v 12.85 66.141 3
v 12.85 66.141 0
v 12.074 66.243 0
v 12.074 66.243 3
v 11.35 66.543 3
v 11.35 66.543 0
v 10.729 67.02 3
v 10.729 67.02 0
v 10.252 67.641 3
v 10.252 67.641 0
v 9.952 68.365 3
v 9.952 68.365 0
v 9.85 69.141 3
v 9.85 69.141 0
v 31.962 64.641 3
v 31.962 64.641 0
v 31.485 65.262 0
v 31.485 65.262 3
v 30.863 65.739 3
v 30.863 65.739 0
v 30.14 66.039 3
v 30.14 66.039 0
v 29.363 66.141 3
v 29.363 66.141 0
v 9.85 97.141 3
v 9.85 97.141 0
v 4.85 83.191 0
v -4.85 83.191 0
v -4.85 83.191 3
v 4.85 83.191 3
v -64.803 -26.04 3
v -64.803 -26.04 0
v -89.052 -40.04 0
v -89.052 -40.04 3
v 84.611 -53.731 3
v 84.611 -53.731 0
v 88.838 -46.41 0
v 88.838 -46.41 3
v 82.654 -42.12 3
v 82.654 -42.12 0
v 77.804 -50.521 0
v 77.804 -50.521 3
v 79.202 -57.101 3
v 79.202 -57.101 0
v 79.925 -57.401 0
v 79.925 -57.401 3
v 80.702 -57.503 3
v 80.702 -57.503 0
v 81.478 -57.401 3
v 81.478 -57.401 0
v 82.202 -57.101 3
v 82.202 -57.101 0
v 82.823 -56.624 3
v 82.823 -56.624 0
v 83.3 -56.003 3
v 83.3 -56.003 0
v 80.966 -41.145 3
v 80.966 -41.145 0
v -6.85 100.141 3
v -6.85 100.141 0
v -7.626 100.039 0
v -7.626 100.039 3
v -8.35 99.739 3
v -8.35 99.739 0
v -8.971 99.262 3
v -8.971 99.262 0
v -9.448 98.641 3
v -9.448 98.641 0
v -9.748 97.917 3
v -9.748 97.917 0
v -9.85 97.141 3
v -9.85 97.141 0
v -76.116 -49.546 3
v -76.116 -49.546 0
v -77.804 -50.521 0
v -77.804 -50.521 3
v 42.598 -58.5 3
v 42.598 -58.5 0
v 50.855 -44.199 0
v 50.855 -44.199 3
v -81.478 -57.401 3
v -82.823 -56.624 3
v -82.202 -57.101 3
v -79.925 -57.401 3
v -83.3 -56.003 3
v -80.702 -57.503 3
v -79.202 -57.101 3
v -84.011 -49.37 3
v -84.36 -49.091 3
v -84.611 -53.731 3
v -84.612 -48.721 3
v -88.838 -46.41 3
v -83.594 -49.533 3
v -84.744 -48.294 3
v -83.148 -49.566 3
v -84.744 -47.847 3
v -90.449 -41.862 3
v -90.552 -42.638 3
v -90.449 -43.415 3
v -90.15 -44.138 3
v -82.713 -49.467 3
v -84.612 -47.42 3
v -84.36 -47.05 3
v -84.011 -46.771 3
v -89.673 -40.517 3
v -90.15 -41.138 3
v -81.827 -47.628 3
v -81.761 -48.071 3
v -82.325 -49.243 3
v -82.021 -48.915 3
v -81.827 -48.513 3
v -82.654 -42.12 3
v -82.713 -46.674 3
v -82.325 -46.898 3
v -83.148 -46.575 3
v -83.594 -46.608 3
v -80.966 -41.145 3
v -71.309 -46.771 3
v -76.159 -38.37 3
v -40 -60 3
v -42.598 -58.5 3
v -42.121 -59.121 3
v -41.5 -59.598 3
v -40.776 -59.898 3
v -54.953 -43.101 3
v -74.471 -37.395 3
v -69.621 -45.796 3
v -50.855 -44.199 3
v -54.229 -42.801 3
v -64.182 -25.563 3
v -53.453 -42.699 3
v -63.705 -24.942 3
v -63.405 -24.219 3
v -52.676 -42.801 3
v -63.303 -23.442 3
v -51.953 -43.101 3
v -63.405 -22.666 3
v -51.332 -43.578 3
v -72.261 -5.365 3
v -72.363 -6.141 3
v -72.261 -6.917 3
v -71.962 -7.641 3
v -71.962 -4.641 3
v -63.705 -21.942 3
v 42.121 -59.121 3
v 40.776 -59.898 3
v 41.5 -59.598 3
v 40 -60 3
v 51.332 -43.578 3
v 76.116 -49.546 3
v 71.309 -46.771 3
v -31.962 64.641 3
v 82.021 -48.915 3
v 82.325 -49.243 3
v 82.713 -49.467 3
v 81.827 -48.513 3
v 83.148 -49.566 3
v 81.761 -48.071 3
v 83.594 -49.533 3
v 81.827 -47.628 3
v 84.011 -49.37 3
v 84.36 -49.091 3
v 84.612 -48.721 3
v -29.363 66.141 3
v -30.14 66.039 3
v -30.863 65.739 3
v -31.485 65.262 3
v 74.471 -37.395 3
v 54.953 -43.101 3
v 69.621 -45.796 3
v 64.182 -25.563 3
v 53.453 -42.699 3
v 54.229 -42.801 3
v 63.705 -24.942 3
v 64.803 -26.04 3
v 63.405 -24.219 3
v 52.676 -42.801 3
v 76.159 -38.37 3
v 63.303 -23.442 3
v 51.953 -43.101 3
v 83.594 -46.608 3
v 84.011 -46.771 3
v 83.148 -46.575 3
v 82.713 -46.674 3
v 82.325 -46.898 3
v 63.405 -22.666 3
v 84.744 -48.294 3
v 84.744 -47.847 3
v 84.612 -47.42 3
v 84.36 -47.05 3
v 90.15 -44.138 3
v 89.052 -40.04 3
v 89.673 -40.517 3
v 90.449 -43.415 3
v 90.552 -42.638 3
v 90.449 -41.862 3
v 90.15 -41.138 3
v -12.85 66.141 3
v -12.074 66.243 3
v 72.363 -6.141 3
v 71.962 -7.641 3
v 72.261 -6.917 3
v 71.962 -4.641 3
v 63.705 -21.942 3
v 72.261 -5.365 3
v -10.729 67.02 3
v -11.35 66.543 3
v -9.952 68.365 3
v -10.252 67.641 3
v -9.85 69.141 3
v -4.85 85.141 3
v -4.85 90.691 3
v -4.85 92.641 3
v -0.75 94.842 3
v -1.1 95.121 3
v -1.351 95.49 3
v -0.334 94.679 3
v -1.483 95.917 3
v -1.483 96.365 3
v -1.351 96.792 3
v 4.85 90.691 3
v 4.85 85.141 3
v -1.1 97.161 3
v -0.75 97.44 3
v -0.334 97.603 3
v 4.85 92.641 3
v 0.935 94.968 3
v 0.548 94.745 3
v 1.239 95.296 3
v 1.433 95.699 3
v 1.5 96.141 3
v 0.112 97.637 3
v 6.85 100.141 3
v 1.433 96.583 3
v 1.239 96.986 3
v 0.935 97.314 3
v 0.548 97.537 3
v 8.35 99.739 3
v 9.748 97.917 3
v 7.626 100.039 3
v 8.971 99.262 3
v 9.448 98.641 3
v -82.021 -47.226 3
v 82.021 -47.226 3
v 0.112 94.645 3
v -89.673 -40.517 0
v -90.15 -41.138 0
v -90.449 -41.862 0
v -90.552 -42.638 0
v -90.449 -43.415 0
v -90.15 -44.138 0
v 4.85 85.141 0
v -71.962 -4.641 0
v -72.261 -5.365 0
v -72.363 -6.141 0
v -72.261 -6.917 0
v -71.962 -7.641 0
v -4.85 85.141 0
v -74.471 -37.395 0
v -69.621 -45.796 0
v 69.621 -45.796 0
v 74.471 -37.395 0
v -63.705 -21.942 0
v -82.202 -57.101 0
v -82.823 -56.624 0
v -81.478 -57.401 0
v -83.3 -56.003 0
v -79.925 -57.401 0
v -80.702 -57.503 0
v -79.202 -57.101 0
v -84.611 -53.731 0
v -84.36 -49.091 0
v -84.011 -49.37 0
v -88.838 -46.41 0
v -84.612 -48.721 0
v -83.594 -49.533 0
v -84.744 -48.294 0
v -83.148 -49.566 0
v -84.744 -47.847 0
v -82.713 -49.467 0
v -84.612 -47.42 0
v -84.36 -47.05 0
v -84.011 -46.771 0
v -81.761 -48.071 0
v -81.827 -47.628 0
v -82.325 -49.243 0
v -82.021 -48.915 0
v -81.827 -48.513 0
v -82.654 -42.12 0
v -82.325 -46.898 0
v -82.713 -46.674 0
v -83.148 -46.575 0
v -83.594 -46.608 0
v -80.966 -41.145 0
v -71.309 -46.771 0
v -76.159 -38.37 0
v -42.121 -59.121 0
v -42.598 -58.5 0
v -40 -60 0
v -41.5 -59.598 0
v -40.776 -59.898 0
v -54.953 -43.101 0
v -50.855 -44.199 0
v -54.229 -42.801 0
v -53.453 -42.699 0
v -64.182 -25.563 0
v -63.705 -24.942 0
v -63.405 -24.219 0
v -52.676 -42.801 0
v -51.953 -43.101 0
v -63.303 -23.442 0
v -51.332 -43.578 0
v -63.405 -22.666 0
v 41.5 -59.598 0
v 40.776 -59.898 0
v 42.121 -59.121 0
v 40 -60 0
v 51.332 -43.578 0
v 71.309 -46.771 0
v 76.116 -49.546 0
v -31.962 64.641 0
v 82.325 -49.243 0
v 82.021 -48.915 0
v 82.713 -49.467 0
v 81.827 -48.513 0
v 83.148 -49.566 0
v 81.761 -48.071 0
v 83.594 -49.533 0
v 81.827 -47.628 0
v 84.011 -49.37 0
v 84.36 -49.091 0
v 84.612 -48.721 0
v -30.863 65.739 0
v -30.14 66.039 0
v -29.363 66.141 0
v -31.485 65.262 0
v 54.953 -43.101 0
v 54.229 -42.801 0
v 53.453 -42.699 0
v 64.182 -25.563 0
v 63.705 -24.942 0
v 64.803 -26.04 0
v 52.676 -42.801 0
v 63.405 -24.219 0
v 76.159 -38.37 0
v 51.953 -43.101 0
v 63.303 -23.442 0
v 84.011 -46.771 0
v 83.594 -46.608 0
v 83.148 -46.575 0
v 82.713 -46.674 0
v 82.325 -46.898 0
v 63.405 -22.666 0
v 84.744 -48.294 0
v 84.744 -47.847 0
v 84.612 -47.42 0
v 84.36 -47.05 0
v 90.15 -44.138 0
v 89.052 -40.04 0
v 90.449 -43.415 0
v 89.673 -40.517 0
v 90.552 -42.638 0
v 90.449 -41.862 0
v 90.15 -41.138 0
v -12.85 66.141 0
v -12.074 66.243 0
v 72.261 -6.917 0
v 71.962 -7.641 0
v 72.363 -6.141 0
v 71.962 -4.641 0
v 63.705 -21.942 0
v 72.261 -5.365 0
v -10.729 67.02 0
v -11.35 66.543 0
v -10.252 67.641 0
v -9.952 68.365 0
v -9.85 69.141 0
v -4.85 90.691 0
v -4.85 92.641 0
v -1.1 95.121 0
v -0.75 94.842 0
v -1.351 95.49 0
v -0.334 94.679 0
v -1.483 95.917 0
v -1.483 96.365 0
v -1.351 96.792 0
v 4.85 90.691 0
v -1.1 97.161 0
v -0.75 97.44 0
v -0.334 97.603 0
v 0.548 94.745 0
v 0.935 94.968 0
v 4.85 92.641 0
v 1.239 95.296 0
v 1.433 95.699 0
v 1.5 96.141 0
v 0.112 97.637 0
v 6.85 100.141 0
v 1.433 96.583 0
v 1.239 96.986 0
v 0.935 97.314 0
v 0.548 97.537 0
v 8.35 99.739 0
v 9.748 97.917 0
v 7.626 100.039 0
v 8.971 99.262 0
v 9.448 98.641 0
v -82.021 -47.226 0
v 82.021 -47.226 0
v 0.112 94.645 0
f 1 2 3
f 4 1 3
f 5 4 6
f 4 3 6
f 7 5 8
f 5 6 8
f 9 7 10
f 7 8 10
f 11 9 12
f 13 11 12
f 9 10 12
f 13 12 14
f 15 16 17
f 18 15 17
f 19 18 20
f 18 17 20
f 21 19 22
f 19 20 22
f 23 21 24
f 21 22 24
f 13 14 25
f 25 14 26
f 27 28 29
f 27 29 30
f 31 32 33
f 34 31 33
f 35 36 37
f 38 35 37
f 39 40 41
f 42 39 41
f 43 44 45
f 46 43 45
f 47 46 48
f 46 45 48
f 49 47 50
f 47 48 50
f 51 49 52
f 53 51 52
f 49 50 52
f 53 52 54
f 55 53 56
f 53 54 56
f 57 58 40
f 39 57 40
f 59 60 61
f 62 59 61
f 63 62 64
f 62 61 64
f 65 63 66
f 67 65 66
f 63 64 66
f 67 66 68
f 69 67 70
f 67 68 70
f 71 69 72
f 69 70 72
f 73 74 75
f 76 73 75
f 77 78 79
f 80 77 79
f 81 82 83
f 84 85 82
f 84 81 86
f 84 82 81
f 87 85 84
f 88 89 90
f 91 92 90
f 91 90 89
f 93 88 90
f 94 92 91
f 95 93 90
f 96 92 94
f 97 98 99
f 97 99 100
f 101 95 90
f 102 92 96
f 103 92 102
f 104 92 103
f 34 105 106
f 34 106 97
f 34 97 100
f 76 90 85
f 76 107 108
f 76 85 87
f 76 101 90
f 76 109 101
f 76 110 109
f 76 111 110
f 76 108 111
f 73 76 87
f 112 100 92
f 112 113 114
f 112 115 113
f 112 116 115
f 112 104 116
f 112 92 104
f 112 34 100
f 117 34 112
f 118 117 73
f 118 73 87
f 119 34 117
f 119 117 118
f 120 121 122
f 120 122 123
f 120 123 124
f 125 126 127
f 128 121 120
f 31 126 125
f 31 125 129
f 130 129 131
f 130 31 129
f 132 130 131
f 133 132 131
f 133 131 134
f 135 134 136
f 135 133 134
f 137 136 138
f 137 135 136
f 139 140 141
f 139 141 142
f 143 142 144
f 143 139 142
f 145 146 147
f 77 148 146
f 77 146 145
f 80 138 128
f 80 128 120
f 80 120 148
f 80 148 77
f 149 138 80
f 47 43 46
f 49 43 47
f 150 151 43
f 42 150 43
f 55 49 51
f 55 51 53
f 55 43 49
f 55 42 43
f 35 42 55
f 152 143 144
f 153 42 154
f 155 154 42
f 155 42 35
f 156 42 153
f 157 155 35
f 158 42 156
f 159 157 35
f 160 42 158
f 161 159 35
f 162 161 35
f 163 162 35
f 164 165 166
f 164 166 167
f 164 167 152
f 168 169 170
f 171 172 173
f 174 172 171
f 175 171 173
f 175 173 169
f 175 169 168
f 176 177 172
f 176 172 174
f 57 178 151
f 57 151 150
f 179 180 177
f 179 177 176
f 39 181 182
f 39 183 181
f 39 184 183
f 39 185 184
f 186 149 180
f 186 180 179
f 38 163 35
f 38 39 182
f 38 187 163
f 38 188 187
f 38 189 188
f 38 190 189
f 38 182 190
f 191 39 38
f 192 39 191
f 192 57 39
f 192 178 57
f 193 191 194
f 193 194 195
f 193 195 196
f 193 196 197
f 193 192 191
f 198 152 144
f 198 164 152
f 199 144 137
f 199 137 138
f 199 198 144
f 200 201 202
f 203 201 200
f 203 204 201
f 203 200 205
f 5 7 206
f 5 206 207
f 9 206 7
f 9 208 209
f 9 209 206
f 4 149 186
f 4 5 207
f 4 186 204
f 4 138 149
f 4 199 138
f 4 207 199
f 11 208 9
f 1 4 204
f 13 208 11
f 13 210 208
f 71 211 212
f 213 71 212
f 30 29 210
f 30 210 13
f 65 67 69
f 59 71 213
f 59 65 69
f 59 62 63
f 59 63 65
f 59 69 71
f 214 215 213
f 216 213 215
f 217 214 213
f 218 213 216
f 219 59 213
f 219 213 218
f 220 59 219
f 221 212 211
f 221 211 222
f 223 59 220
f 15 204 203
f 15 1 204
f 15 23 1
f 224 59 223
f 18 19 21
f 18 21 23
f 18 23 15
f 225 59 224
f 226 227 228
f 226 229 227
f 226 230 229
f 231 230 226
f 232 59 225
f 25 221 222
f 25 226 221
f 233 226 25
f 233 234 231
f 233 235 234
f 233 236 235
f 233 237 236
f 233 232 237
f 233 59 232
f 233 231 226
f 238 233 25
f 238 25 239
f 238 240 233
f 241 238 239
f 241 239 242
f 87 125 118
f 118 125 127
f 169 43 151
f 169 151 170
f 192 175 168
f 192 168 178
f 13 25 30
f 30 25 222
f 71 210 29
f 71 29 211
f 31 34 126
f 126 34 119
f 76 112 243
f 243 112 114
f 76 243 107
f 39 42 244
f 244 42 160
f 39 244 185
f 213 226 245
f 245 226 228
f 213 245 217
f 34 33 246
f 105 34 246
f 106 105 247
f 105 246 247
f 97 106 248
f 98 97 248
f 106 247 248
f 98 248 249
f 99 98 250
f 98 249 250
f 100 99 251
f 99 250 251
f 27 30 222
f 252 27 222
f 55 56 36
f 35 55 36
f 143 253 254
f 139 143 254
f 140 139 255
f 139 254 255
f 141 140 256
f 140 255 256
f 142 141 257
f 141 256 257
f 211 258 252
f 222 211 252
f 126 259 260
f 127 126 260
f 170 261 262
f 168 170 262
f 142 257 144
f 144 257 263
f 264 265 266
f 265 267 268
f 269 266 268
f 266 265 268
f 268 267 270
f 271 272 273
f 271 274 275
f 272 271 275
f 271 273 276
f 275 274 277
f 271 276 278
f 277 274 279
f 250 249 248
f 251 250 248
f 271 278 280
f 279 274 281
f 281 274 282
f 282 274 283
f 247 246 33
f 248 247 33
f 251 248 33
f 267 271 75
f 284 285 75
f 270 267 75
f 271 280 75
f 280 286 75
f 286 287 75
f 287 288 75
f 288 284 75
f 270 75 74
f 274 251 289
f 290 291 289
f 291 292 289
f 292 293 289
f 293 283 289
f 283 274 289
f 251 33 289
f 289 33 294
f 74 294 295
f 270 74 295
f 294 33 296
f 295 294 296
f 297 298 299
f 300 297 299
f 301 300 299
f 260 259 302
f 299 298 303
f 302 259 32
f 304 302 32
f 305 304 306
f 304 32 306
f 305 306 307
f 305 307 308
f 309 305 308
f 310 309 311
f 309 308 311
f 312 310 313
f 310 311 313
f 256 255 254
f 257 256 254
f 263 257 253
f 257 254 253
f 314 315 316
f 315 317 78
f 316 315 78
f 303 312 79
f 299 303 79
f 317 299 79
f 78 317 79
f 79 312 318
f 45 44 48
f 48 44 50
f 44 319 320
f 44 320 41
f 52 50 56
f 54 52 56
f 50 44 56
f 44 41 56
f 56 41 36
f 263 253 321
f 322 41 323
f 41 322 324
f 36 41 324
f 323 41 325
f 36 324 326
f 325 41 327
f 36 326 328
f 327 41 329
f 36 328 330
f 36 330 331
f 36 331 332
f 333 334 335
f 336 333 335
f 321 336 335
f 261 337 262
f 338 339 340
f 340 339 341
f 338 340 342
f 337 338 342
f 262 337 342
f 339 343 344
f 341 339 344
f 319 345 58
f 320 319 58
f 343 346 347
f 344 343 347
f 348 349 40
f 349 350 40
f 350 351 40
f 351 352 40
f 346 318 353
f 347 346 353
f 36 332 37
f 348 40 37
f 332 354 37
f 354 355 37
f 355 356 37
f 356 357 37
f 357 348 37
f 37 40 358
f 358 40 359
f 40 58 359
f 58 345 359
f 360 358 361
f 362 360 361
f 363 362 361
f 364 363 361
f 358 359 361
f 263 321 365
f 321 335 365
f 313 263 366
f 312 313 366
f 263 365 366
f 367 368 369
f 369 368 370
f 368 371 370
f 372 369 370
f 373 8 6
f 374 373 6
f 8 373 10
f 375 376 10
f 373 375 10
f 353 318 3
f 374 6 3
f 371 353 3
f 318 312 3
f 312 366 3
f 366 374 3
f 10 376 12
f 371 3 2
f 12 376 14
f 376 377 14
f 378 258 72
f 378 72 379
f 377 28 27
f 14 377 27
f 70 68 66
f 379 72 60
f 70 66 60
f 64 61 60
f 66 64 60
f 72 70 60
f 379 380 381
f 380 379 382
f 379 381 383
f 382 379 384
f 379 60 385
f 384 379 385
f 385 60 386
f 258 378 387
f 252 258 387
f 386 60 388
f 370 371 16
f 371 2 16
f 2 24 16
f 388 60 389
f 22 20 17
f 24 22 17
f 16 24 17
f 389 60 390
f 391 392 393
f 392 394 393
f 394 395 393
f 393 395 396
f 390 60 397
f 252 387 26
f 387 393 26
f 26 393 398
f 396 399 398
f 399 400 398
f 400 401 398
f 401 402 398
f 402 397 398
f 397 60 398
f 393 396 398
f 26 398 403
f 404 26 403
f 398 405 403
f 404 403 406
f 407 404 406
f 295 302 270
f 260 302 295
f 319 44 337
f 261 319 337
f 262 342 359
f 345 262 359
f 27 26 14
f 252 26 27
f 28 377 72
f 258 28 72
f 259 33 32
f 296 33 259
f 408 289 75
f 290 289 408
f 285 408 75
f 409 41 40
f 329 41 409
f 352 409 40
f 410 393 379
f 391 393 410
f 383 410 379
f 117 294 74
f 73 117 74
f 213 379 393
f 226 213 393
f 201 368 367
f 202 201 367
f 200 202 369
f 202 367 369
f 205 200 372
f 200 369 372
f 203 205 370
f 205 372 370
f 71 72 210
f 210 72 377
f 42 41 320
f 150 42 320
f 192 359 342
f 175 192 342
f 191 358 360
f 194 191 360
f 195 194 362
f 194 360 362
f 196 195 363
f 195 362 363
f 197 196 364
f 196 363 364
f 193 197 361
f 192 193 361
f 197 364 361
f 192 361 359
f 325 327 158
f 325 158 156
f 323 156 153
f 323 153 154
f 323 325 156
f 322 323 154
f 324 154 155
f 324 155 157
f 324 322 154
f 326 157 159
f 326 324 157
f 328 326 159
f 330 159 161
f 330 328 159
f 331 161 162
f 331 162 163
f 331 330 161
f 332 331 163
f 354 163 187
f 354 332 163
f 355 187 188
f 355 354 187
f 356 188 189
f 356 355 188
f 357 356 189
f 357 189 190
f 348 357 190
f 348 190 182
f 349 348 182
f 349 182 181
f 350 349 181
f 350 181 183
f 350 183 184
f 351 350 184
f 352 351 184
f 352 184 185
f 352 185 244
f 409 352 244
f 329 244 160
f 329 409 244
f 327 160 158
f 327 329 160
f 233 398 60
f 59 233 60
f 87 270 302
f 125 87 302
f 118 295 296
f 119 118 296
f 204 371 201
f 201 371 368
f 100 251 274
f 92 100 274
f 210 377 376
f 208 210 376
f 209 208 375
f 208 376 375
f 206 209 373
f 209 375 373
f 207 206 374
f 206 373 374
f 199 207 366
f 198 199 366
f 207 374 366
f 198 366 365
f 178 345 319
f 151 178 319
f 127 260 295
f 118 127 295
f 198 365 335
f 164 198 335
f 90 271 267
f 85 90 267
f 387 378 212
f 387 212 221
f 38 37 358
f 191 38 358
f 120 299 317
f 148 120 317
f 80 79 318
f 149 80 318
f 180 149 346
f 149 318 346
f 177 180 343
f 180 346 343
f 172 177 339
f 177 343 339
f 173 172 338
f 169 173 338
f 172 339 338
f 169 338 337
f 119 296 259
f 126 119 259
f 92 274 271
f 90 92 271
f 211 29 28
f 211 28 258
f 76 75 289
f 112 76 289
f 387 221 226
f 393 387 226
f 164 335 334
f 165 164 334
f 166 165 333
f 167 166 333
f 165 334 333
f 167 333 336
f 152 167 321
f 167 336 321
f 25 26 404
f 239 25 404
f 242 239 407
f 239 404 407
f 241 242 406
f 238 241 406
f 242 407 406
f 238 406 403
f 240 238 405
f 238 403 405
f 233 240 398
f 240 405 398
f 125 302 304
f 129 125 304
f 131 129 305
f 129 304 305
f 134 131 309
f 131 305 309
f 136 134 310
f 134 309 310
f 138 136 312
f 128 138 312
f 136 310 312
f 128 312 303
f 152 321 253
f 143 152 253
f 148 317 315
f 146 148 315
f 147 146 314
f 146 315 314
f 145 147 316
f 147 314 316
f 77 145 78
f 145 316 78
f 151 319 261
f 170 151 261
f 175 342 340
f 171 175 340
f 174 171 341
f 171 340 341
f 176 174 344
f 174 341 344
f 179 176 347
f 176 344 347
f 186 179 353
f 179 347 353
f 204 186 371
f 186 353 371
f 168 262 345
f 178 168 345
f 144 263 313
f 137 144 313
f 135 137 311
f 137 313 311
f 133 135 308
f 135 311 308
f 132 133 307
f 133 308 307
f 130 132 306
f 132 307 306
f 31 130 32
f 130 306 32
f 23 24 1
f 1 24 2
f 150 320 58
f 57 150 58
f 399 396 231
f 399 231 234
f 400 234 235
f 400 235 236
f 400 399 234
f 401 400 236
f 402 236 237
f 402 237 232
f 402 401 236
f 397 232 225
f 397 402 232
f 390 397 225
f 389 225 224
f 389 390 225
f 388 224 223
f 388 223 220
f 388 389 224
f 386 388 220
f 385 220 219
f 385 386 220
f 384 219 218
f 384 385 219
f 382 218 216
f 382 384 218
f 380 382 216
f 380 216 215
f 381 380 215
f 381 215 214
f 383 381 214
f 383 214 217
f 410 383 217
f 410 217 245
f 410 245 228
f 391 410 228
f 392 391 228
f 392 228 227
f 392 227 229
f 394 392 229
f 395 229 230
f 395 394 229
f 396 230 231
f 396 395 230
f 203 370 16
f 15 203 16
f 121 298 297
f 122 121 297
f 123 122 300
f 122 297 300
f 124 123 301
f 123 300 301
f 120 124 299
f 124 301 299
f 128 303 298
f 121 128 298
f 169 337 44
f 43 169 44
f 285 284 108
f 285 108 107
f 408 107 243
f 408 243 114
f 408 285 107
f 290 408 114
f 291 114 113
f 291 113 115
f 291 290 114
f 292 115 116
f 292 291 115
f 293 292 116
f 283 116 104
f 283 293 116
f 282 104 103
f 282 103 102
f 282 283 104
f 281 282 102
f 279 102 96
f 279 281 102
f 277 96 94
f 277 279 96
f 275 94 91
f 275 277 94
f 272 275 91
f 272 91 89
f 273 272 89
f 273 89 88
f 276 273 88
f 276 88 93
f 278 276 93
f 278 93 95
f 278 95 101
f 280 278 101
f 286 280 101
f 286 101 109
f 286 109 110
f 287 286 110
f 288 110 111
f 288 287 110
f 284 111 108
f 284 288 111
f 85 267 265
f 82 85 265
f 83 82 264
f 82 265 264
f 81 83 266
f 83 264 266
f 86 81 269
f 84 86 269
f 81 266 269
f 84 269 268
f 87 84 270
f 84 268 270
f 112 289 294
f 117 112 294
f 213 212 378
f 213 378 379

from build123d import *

# Parameters (mm, degrees)
SKETCH_1_R      = 1.5
SKETCH_1_W      = 9.7
SKETCH_1_H      = 1.95
EXTRUDE_3_DEPTH = 3


with BuildPart() as part:
    # Эскиз1 → Бобышка-Вытянуть3 (new body)
    with BuildSketch(Plane.XY):
        with BuildLine():
            Line((-88.837912602, -46.410254038), (-84.611415294, -53.730762114))
            Line((-84.611415294, -53.730762114), (-83.299663948, -56.002782092))
            ThreePointArc((-83.299663948, -56.002782092), (-81.478044872, -57.40055957), (-79.201587737, -57.100858303))
            Line((-79.201587737, -57.100858303), (-54.952876431, -43.100858303))
            ThreePointArc((-54.952876431, -43.100858303), (-52.676419295, -42.801157035), (-50.854800219, -44.198934514))
            Line((-50.854800219, -44.198934514), (-42.598076211, -58.5))
            ThreePointArc((-42.598076211, -58.5), (-41.5, -59.598076211), (-40, -60))
            Line((-40, -60), (40, -60))
            ThreePointArc((40, -60), (41.5, -59.598076211), (42.598076211, -58.5))
            Line((42.598076211, -58.5), (50.854800219, -44.198934514))
            ThreePointArc((50.854800219, -44.198934514), (52.676419295, -42.801157035), (54.952876431, -43.100858303))
            Line((54.952876431, -43.100858303), (79.201587737, -57.100858303))
            ThreePointArc((79.201587737, -57.100858303), (81.478044872, -57.40055957), (83.299663948, -56.002782092))
            Line((83.299663948, -56.002782092), (84.611415294, -53.730762114))
            Line((84.611415294, -53.730762114), (88.837912602, -46.410254038))
            Line((88.837912602, -46.410254038), (90.149663948, -44.13823406))
            ThreePointArc((90.149663948, -44.13823406), (90.449365215, -41.861776924), (89.051587737, -40.040157848))
            Line((89.051587737, -40.040157848), (64.802876431, -26.040157848))
            ThreePointArc((64.802876431, -26.040157848), (63.405098952, -24.218538772), (63.704800219, -21.942081637))
            Line((63.704800219, -21.942081637), (71.961524227, -7.641016151))
            ThreePointArc((71.961524227, -7.641016151), (72.363448016, -6.141016151), (71.961524227, -4.641016151))
            Line((71.961524227, -4.641016151), (31.961524227, 64.641016151))
            ThreePointArc((31.961524227, 64.641016151), (30.863448016, 65.739092363), (29.363448016, 66.141016151))
            Line((29.363448016, 66.141016151), (12.85, 66.141016151))
            ThreePointArc((12.85, 66.141016151), (10.728679656, 67.019695808), (9.85, 69.141016151))
            Line((9.85, 69.141016151), (9.85, 97.141016151))
            ThreePointArc((9.85, 97.141016151), (8.971320344, 99.262336495), (6.85, 100.141016151))
            Line((6.85, 100.141016151), (4.226497308, 100.141016151))
            Line((4.226497308, 100.141016151), (-4.226497308, 100.141016151))
            Line((-4.226497308, 100.141016151), (-6.85, 100.141016151))
            ThreePointArc((-6.85, 100.141016151), (-8.971320344, 99.262336495), (-9.85, 97.141016151))
            Line((-9.85, 97.141016151), (-9.85, 69.141016151))
            ThreePointArc((-9.85, 69.141016151), (-10.728679656, 67.019695808), (-12.85, 66.141016151))
            Line((-12.85, 66.141016151), (-29.363448016, 66.141016151))
            ThreePointArc((-29.363448016, 66.141016151), (-30.863448016, 65.739092363), (-31.961524227, 64.641016151))
            Line((-31.961524227, 64.641016151), (-71.961524227, -4.641016151))
            ThreePointArc((-71.961524227, -4.641016151), (-72.363448016, -6.141016151), (-71.961524227, -7.641016151))
            Line((-71.961524227, -7.641016151), (-63.704800219, -21.942081637))
            ThreePointArc((-63.704800219, -21.942081637), (-63.405098952, -24.218538772), (-64.802876431, -26.040157848))
            Line((-64.802876431, -26.040157848), (-89.051587737, -40.040157848))
            ThreePointArc((-89.051587737, -40.040157848), (-90.449365215, -41.861776924), (-90.149663948, -44.13823406))
            Line((-90.149663948, -44.13823406), (-88.837912602, -46.410254038))
        make_face()
        with Locations((-83.260562333, -48.070508076)):
            Circle(SKETCH_1_R, mode=Mode.SUBTRACT)
        with Locations(Location((83.260562333, -48.070508076, 0), (0, 0, 180))):
            Circle(SKETCH_1_R, mode=Mode.SUBTRACT)
        with Locations((0, 96.141016151)):
            Circle(SKETCH_1_R, mode=Mode.SUBTRACT)
        Polygon((-77.804473419, -50.520731284), (-82.654473419, -42.120284867), (-80.965723882, -41.145284867), (-76.115723882, -49.545731284), align=None, mode=Mode.SUBTRACT)
        Polygon((-71.309282891, -46.770731284), (-76.159282891, -38.370284867), (-74.470533354, -37.395284867), (-69.620533354, -45.795731284), align=None, mode=Mode.SUBTRACT)
        Polygon((69.620533354, -45.795731284), (74.470533354, -37.395284867), (76.159282891, -38.370284867), (71.309282891, -46.770731284), align=None, mode=Mode.SUBTRACT)
        Polygon((76.115723882, -49.545731284), (80.965723882, -41.145284867), (82.654473419, -42.120284867), (77.804473419, -50.520731284), align=None, mode=Mode.SUBTRACT)
        with Locations((0, 91.666016151)):
            Rectangle(SKETCH_1_W, SKETCH_1_H, mode=Mode.SUBTRACT)
        with Locations((0, 84.166016151)):
            Rectangle(SKETCH_1_W, SKETCH_1_H, mode=Mode.SUBTRACT)
    extrude(amount=EXTRUDE_3_DEPTH)


solid = part.part
